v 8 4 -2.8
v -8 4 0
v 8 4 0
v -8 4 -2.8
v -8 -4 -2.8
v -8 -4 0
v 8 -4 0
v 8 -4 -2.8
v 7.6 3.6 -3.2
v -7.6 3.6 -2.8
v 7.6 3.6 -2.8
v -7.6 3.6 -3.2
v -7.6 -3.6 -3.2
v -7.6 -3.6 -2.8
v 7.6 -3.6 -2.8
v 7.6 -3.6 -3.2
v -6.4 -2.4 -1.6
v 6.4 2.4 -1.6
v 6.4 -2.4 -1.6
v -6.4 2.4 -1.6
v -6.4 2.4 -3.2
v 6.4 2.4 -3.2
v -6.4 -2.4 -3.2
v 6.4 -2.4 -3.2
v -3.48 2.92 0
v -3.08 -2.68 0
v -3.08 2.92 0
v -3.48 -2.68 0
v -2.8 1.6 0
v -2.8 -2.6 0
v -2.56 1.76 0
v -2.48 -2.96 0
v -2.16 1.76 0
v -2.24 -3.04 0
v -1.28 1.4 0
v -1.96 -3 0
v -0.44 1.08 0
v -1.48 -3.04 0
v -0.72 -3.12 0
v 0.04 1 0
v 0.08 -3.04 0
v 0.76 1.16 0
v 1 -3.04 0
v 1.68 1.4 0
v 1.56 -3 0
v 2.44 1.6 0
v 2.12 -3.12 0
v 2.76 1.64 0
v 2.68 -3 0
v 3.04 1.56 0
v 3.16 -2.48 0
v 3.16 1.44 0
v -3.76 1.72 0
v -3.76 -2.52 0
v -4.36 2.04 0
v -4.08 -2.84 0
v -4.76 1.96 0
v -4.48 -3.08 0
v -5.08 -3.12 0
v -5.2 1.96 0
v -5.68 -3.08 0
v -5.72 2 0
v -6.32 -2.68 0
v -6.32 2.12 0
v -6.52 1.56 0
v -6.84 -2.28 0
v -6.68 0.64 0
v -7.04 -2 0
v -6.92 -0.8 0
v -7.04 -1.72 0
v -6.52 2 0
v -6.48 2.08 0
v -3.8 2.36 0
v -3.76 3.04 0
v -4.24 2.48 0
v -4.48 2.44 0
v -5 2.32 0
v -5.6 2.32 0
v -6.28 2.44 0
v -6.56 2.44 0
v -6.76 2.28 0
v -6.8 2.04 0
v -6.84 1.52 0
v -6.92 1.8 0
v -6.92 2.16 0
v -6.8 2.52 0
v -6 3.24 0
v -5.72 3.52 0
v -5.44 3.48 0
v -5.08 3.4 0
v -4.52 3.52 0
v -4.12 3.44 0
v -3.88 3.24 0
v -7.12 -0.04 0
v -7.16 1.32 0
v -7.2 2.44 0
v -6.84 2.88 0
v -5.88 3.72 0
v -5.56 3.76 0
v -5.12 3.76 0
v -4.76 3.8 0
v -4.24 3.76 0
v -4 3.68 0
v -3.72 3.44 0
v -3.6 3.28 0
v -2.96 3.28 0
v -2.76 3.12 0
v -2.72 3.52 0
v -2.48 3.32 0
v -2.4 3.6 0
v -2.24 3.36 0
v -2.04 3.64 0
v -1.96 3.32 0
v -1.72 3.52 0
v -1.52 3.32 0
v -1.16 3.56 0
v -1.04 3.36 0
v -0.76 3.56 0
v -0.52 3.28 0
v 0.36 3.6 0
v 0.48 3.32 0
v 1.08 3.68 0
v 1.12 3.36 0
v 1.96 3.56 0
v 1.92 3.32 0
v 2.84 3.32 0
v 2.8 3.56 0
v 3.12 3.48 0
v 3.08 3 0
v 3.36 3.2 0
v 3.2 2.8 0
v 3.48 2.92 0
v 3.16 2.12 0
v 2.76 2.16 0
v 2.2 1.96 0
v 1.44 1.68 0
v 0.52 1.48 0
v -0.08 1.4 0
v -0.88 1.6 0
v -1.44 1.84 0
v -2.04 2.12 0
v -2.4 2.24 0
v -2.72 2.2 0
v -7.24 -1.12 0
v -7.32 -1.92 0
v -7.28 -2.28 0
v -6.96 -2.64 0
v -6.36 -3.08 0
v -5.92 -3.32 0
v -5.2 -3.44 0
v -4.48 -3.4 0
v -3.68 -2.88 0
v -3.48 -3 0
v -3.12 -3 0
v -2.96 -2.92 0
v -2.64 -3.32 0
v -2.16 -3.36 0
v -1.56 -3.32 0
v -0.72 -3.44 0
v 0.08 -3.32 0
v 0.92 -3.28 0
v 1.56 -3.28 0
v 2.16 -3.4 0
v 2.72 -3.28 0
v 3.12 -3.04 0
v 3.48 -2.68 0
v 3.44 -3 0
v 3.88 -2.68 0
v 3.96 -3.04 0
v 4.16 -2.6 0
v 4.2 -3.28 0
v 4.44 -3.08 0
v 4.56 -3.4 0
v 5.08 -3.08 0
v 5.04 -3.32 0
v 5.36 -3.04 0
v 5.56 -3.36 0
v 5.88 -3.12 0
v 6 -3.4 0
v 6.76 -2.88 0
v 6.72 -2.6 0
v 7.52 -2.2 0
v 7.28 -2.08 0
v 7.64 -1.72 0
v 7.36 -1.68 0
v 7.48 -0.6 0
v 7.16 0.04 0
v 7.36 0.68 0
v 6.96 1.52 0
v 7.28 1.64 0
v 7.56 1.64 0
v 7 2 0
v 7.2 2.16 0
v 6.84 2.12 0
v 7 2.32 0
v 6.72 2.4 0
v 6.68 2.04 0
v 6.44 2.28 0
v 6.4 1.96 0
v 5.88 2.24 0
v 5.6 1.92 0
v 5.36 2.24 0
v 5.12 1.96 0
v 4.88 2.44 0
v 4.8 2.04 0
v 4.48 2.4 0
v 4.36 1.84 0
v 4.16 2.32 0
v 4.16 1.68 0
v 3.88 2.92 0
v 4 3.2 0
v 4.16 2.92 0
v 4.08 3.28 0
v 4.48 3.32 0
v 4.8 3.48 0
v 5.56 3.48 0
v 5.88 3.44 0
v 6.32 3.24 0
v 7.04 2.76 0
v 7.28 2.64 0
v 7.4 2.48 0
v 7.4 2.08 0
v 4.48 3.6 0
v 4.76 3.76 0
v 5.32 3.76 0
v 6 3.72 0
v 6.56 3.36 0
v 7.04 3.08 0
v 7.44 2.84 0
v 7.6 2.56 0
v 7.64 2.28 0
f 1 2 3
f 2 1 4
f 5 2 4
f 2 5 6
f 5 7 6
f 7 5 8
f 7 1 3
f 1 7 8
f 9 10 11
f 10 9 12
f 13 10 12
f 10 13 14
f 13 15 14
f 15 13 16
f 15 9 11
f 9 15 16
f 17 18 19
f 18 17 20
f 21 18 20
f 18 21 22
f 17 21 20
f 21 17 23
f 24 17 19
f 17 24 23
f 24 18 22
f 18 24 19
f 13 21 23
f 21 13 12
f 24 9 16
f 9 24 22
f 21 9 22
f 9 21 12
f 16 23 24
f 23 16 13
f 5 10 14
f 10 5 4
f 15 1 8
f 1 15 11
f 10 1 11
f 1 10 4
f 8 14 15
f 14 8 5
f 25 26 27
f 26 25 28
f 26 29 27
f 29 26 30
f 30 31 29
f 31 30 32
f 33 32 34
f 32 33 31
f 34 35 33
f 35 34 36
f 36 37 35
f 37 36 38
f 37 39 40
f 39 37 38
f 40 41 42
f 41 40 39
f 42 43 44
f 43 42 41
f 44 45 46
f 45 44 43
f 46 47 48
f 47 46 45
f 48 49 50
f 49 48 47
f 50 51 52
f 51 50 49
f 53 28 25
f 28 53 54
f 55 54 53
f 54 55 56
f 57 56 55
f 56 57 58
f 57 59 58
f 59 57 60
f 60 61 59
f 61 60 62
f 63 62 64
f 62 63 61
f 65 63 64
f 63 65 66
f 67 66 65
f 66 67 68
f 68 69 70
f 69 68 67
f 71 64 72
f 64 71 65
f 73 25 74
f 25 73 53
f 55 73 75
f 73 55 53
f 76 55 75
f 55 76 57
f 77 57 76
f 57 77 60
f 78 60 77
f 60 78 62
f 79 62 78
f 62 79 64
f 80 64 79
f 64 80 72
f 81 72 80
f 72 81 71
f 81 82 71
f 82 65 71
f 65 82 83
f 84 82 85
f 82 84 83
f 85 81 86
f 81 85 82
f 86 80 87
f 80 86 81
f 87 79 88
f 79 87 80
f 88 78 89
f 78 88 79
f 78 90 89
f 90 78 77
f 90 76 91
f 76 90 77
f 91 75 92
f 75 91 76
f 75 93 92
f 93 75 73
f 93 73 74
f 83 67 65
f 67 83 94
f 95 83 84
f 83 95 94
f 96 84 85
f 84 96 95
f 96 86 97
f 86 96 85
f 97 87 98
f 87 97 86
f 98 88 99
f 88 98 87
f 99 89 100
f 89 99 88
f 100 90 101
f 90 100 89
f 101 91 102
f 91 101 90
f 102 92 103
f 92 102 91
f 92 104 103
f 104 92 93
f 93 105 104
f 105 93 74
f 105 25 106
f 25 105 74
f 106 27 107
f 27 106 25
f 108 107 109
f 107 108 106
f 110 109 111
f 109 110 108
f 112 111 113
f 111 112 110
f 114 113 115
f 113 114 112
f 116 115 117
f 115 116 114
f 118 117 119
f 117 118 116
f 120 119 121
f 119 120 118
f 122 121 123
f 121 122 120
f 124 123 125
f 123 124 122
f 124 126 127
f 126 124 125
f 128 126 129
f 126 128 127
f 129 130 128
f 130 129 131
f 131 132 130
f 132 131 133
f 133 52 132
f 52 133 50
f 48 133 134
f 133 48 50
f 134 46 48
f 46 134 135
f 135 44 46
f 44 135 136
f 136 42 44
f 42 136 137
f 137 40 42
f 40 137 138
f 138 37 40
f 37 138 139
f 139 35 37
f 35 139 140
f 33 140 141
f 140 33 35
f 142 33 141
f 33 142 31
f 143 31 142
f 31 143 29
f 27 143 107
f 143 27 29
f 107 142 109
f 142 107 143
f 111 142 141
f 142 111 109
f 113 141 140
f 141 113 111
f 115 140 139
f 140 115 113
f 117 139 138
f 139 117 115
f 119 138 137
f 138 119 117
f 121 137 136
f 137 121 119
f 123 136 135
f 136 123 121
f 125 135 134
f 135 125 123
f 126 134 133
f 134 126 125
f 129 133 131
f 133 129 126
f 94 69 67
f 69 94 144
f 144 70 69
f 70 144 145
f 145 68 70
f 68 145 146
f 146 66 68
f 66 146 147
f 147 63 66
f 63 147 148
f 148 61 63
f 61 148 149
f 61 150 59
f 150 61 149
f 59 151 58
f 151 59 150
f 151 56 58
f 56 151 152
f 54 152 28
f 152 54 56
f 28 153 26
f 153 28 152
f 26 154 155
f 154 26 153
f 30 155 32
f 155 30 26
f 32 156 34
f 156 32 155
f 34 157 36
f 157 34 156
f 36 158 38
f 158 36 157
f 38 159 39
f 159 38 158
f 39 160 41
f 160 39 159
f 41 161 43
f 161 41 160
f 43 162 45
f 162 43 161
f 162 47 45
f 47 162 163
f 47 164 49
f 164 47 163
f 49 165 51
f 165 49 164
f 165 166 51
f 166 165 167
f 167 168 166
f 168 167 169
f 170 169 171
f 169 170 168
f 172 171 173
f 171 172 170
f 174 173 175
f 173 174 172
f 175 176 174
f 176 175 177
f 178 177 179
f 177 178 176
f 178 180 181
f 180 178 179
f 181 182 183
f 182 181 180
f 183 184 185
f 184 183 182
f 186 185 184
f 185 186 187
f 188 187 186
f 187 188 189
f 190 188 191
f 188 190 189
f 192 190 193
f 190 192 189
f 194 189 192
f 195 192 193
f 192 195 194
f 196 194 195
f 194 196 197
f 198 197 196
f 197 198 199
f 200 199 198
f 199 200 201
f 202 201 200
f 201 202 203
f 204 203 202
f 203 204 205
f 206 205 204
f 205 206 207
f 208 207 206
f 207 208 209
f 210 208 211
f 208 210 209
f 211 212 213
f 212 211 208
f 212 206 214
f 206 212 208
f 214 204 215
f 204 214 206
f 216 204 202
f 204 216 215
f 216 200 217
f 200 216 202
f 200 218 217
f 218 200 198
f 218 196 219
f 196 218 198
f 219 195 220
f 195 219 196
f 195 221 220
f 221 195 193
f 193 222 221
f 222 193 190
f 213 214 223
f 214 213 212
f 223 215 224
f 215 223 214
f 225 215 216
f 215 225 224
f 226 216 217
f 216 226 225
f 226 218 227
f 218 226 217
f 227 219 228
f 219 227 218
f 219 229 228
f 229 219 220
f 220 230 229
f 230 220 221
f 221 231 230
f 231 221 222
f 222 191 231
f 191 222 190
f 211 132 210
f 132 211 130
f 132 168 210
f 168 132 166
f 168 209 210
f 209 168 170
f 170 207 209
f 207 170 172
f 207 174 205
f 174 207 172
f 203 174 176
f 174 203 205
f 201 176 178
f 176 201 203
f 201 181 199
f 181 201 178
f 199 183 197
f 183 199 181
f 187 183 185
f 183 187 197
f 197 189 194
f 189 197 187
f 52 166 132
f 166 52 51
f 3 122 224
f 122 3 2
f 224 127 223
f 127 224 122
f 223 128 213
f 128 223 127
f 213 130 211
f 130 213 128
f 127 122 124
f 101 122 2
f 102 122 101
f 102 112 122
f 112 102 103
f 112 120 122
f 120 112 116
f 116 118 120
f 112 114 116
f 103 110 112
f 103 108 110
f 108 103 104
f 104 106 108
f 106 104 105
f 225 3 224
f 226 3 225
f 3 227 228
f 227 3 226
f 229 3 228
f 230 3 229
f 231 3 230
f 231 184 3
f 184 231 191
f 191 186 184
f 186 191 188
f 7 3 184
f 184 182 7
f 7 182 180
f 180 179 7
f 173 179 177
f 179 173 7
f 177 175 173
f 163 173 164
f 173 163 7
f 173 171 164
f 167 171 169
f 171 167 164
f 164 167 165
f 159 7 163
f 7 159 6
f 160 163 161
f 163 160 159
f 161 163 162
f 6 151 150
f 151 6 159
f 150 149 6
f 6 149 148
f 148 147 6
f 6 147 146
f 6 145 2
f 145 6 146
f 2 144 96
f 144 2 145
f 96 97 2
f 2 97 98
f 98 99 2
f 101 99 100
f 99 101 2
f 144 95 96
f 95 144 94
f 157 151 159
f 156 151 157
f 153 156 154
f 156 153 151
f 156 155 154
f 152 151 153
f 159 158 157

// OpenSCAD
// file: ../p/box5.scad
use <../lib.scad>
function ldraw_lib__box5() = [
// 0 Box with 5 Faces and All Edges
// 0 Name: box5.dat
// 0 Author: James Jessiman
// 0 !LDRAW_ORG Primitive UPDATE 2012-01
// 0 !LICENSE Licensed under CC BY 4.0 : see CAreadme.txt
// 
// 0 BFC CERTIFY CCW
  [0,"BFC","CERTIFY"],
  [0,"BFC","CCW"],
// 
// 0 !HISTORY 2002-04-03 [sbliss] Modified for BFC compliance
// 0 !HISTORY 2002-04-25 [PTadmin] Official Update 2002-02
// 0 !HISTORY 2007-06-24 [PTadmin] Header formatted for Contributor Agreement
// 0 !HISTORY 2008-07-01 [PTadmin] Official Update 2008-01
// 0 !HISTORY 2012-02-16 [Philo] Changed to CCW
// 0 !HISTORY 2012-03-30 [PTadmin] Official Update 2012-01
// 
// 
// 2 24 1 1 1 -1 1 1
  [2,24,1,1,1,-1,1,1],
// 2 24 -1 1 1 -1 1 -1
  [2,24,-1,1,1,-1,1,-1],
// 2 24 -1 1 -1 1 1 -1
  [2,24,-1,1,-1,1,1,-1],
// 2 24 1 1 -1 1 1 1
  [2,24,1,1,-1,1,1,1],
// 2 24 1 0 1 -1 0 1
  [2,24,1,0,1,-1,0,1],
// 2 24 -1 0 1 -1 0 -1
  [2,24,-1,0,1,-1,0,-1],
// 2 24 -1 0 -1 1 0 -1
  [2,24,-1,0,-1,1,0,-1],
// 2 24 1 0 -1 1 0 1
  [2,24,1,0,-1,1,0,1],
// 2 24 1 0 1 1 1 1
  [2,24,1,0,1,1,1,1],
// 2 24 -1 0 1 -1 1 1
  [2,24,-1,0,1,-1,1,1],
// 2 24 1 0 -1 1 1 -1
  [2,24,1,0,-1,1,1,-1],
// 2 24 -1 0 -1 -1 1 -1
  [2,24,-1,0,-1,-1,1,-1],
// 4 16 -1 1 1 1 1 1 1 1 -1 -1 1 -1
  [4,16,-1,1,1,1,1,1,1,1,-1,-1,1,-1],
// 4 16 -1 1 1 -1 0 1 1 0 1 1 1 1
  [4,16,-1,1,1,-1,0,1,1,0,1,1,1,1],
// 4 16 -1 1 -1 -1 0 -1 -1 0 1 -1 1 1
  [4,16,-1,1,-1,-1,0,-1,-1,0,1,-1,1,1],
// 4 16 1 1 -1 1 0 -1 -1 0 -1 -1 1 -1
  [4,16,1,1,-1,1,0,-1,-1,0,-1,-1,1,-1],
// 4 16 1 1 1 1 0 1 1 0 -1 1 1 -1
  [4,16,1,1,1,1,0,1,1,0,-1,1,1,-1],
];
module ldraw_lib__box5(step=0, col=false, unit=2/5, alt=false, line=0.2, solid=!$preview)
    makepoly(ldraw_lib__box5(), step=step, col=col, unit=unit, alt=alt, line=line, solid=solid);
ldraw_lib__box5(line=0.2);
// file: ../p/box4.scad
use <../lib.scad>
function ldraw_lib__box4() = [
// 0 Box with 4 Faces (2 Parallel Pairs) and All Edges
// 0 Name: box4.dat
// 0 Author: James Jessiman
// 0 !LDRAW_ORG Primitive UPDATE 2012-01
// 0 !LICENSE Licensed under CC BY 4.0 : see CAreadme.txt
// 
// 0 BFC CERTIFY CCW
  [0,"BFC","CERTIFY"],
  [0,"BFC","CCW"],
// 
// 0 !HISTORY 2002-04-03 [sbliss] Modified for BFC compliance
// 0 !HISTORY 2002-04-25 [PTadmin] Official Update 2002-02
// 0 !HISTORY 2007-06-24 [PTadmin] Header formatted for Contributor Agreement
// 0 !HISTORY 2008-07-01 [PTadmin] Official Update 2008-01
// 0 !HISTORY 2012-02-16 [Philo] Changed to CCW
// 0 !HISTORY 2012-03-30 [PTadmin] Official Update 2012-01
// 
// 
// 2 24 1 1 1 -1 1 1
  [2,24,1,1,1,-1,1,1],
// 2 24 -1 1 1 -1 1 -1
  [2,24,-1,1,1,-1,1,-1],
// 2 24 -1 1 -1 1 1 -1
  [2,24,-1,1,-1,1,1,-1],
// 2 24 1 1 -1 1 1 1
  [2,24,1,1,-1,1,1,1],
// 2 24 1 0 1 -1 0 1
  [2,24,1,0,1,-1,0,1],
// 2 24 -1 0 1 -1 0 -1
  [2,24,-1,0,1,-1,0,-1],
// 2 24 -1 0 -1 1 0 -1
  [2,24,-1,0,-1,1,0,-1],
// 2 24 1 0 -1 1 0 1
  [2,24,1,0,-1,1,0,1],
// 2 24 1 0 1 1 1 1
  [2,24,1,0,1,1,1,1],
// 2 24 -1 0 1 -1 1 1
  [2,24,-1,0,1,-1,1,1],
// 2 24 1 0 -1 1 1 -1
  [2,24,1,0,-1,1,1,-1],
// 2 24 -1 0 -1 -1 1 -1
  [2,24,-1,0,-1,-1,1,-1],
// 4 16 -1 1 1 -1 0 1 1 0 1 1 1 1
  [4,16,-1,1,1,-1,0,1,1,0,1,1,1,1],
// 4 16 -1 1 -1 -1 0 -1 -1 0 1 -1 1 1
  [4,16,-1,1,-1,-1,0,-1,-1,0,1,-1,1,1],
// 4 16 1 1 -1 1 0 -1 -1 0 -1 -1 1 -1
  [4,16,1,1,-1,1,0,-1,-1,0,-1,-1,1,-1],
// 4 16 1 1 1 1 0 1 1 0 -1 1 1 -1
  [4,16,1,1,1,1,0,1,1,0,-1,1,1,-1],
];
module ldraw_lib__box4(step=0, col=false, unit=2/5, alt=false, line=0.2, solid=!$preview)
    makepoly(ldraw_lib__box4(), step=step, col=col, unit=unit, alt=alt, line=line, solid=solid);
ldraw_lib__box4(line=0.2);
// file: s/3069p0fs02.scad
use <../../lib.scad>
function ldraw_lib__s__3069p0fs02() = [
// 0 ~Tile  1 x  2 with Bedroll Pattern - Frame
// 0 Name: s\3069p0fs02.dat
// 0 Author: Alex Taylor [anathema]
// 0 !LDRAW_ORG Subpart UPDATE 2014-01
// 0 !LICENSE Licensed under CC BY 4.0 : see CAreadme.txt
// 
// 0 BFC CERTIFY CCW
  [0,"BFC","CERTIFY"],
  [0,"BFC","CCW"],
// 
// 0 !HISTORY 2014-01-18 [smr] moved bedroll frame from from 3069bp0f to s\3069p0fs02.dat
// 0 !HISTORY 2014-06-21 [PTadmin] Official Update 2014-01
// 
// 
// 4 16 11.9 0 9.4 20 0 10 -20 0 10 2.7 0 9.2
  [4,16,11.9,0,9.4,20,0,10,-20,0,10,2.7,0,9.2],
// 4 16 11.9 0 9.4 2.7 0 9.2 7 0 8.9 11.2 0 9
  [4,16,11.9,0,9.4,2.7,0,9.2,7,0,8.9,11.2,0,9],
// 4 16 11.2 0 9 7 0 8.9 7.8 0 8.7 10.2 0 8.2
  [4,16,11.2,0,9,7,0,8.9,7.8,0,8.7,10.2,0,8.2],
// 4 16 10.2 0 8.2 7.8 0 8.7 8.4 0 8 10 0 8
  [4,16,10.2,0,8.2,7.8,0,8.7,8.4,0,8,10,0,8],
// 3 16 7 0 8.9 2.7 0 9.2 4.9 0 8.9
  [3,16,7,0,8.9,2.7,0,9.2,4.9,0,8.9],
// 3 16 -11.9 0 9.5 2.7 0 9.2 -20 0 10
  [3,16,-11.9,0,9.5,2.7,0,9.2,-20,0,10],
// 3 16 -10.6 0 9.4 2.7 0 9.2 -11.9 0 9.5
  [3,16,-10.6,0,9.4,2.7,0,9.2,-11.9,0,9.5],
// 4 16 2.7 0 9.2 -10.6 0 9.4 -10 0 9.2 -5.1 0 9.1
  [4,16,2.7,0,9.2,-10.6,0,9.4,-10,0,9.2,-5.1,0,9.1],
// 4 16 2.7 0 9.2 -5.1 0 9.1 -2.9 0 8.9 0.9 0 9
  [4,16,2.7,0,9.2,-5.1,0,9.1,-2.9,0,8.9,0.9,0,9],
// 3 16 -2.9 0 8.9 -1.9 0 8.9 0.9 0 9
  [3,16,-2.9,0,8.9,-1.9,0,8.9,0.9,0,9],
// 3 16 -5.1 0 9.1 -4.3 0 8.8 -2.9 0 8.9
  [3,16,-5.1,0,9.1,-4.3,0,8.8,-2.9,0,8.9],
// 3 16 -10 0 9.2 -6 0 9 -5.1 0 9.1
  [3,16,-10,0,9.2,-6,0,9,-5.1,0,9.1],
// 4 16 -6.8 0 8.8 -6 0 9 -10 0 9.2 -9.3 0 8.6
  [4,16,-6.8,0,8.8,-6,0,9,-10,0,9.2,-9.3,0,8.6],
// 4 16 -7.4 0 8.2 -6.8 0 8.8 -9.3 0 8.6 -9 0 8.2
  [4,16,-7.4,0,8.2,-6.8,0,8.8,-9.3,0,8.6,-9,0,8.2],
// 3 16 13.3 0 9.4 20 0 10 11.9 0 9.4
  [3,16,13.3,0,9.4,20,0,10,11.9,0,9.4],
// 3 16 15 0 9.3 20 0 10 13.3 0 9.4
  [3,16,15,0,9.3,20,0,10,13.3,0,9.4],
// 4 16 20 0 10 15 0 9.3 16.4 0 8.4 17.6 0 7.7
  [4,16,20,0,10,15,0,9.3,16.4,0,8.4,17.6,0,7.7],
// 3 16 18.6 0 7.1 20 0 10 17.6 0 7.7
  [3,16,18.6,0,7.1,20,0,10,17.6,0,7.7],
// 3 16 19 0 6.4 20 0 10 18.6 0 7.1
  [3,16,19,0,6.4,20,0,10,18.6,0,7.1],
// 3 16 19.1 0 5.7 20 0 10 19 0 6.4
  [3,16,19.1,0,5.7,20,0,10,19,0,6.4],
// 4 16 19.1 0 -4.3 20 0 10 19.1 0 5.7 18.9 0 4.1
  [4,16,19.1,0,-4.3,20,0,10,19.1,0,5.7,18.9,0,4.1],
// 4 16 19.1 0 -4.3 18.9 0 4.1 18.4 0 1.7 18.7 0 -1.5
  [4,16,19.1,0,-4.3,18.9,0,4.1,18.4,0,1.7,18.7,0,-1.5],
// 3 16 20 0 -10 20 0 10 19.1 0 -4.3
  [3,16,20,0,-10,20,0,10,19.1,0,-4.3],
// 3 16 19.1 0 -4.3 18.8 0 -5.5 20 0 -10
  [3,16,19.1,0,-4.3,18.8,0,-5.5,20,0,-10],
// 3 16 20 0 -10 18.8 0 -5.5 16.9 0 -7.2
  [3,16,20,0,-10,18.8,0,-5.5,16.9,0,-7.2],
// 3 16 16.9 0 -7.2 15 0 -8.5 20 0 -10
  [3,16,16.9,0,-7.2,15,0,-8.5,20,0,-10],
// 4 16 11.4 0 -8.5 20 0 -10 15 0 -8.5 13.9 0 -8.4
  [4,16,11.4,0,-8.5,20,0,-10,15,0,-8.5,13.9,0,-8.4],
// 3 16 13.9 0 -8.4 12.6 0 -8.3 11.4 0 -8.5
  [3,16,13.9,0,-8.4,12.6,0,-8.3,11.4,0,-8.5],
// 4 16 5.4 0 -8.5 20 0 -10 11.4 0 -8.5 6.8 0 -8.2
  [4,16,5.4,0,-8.5,20,0,-10,11.4,0,-8.5,6.8,0,-8.2],
// 3 16 11.4 0 -8.5 10.5 0 -8.2 6.8 0 -8.2
  [3,16,11.4,0,-8.5,10.5,0,-8.2,6.8,0,-8.2],
// 4 16 6.8 0 -8.2 10.5 0 -8.2 9.9 0 -7.6 8.6 0 -7.5
  [4,16,6.8,0,-8.2,10.5,0,-8.2,9.9,0,-7.6,8.6,0,-7.5],
// 3 16 6.8 0 -8.2 8.6 0 -7.5 7.8 0 -7.6
  [3,16,6.8,0,-8.2,8.6,0,-7.5,7.8,0,-7.6],
// 4 16 -20 0 -10 20 0 -10 5.4 0 -8.5 -1.8 0 -8.6
  [4,16,-20,0,-10,20,0,-10,5.4,0,-8.5,-1.8,0,-8.6],
// 4 16 0.2 0 -8.3 -1.8 0 -8.6 5.4 0 -8.5 2.3 0 -8.2
  [4,16,0.2,0,-8.3,-1.8,0,-8.6,5.4,0,-8.5,2.3,0,-8.2],
// 3 16 2.3 0 -8.2 5.4 0 -8.5 3.9 0 -8.2
  [3,16,2.3,0,-8.2,5.4,0,-8.5,3.9,0,-8.2],
// 4 16 -20 0 -10 -1.8 0 -8.6 -11.2 0 -8.5 -13 0 -8.6
  [4,16,-20,0,-10,-1.8,0,-8.6,-11.2,0,-8.5,-13,0,-8.6],
// 3 16 -13 0 -8.6 -14.8 0 -8.3 -20 0 -10
  [3,16,-13,0,-8.6,-14.8,0,-8.3,-20,0,-10],
// 3 16 -20 0 -10 -14.8 0 -8.3 -15.9 0 -7.7
  [3,16,-20,0,-10,-14.8,0,-8.3,-15.9,0,-7.7],
// 3 16 -15.9 0 -7.7 -17.4 0 -6.6 -20 0 -10
  [3,16,-15.9,0,-7.7,-17.4,0,-6.6,-20,0,-10],
// 3 16 -20 0 -10 -17.4 0 -6.6 -18.2 0 -5.7
  [3,16,-20,0,-10,-17.4,0,-6.6,-18.2,0,-5.7],
// 4 16 -20 0 -10 -18.2 0 -5.7 -18.3 0 -4.8 -20 0 10
  [4,16,-20,0,-10,-18.2,0,-5.7,-18.3,0,-4.8,-20,0,10],
// 4 16 -18 0 6.1 -20 0 10 -18.3 0 -4.8 -18.1 0 -2.8
  [4,16,-18,0,6.1,-20,0,10,-18.3,0,-4.8,-18.1,0,-2.8],
// 3 16 -18 0 6.1 -17.1 0 7.2 -20 0 10
  [3,16,-18,0,6.1,-17.1,0,7.2,-20,0,10],
// 3 16 -20 0 10 -17.1 0 7.2 -14.7 0 9.3
  [3,16,-20,0,10,-17.1,0,7.2,-14.7,0,9.3],
// 3 16 -14.7 0 9.3 -13.9 0 9.4 -20 0 10
  [3,16,-14.7,0,9.3,-13.9,0,9.4,-20,0,10],
// 4 16 -20 0 10 -13.9 0 9.4 -12.8 0 9.4 -11.9 0 9.5
  [4,16,-20,0,10,-13.9,0,9.4,-12.8,0,9.4,-11.9,0,9.5],
// 4 16 -18.1 0 -2.8 -17.8 0 -0.1 -17.9 0 3.3 -18 0 6.1
  [4,16,-18.1,0,-2.8,-17.8,0,-0.1,-17.9,0,3.3,-18,0,6.1],
// 3 16 -5.4 0 -8.4 -11.2 0 -8.5 -1.8 0 -8.6
  [3,16,-5.4,0,-8.4,-11.2,0,-8.5,-1.8,0,-8.6],
// 3 16 -6.6 0 -8.3 -11.2 0 -8.5 -5.4 0 -8.4
  [3,16,-6.6,0,-8.3,-11.2,0,-8.5,-5.4,0,-8.4],
// 4 16 -11.2 0 -8.5 -6.6 0 -8.3 -7.8 0 -7.5 -8.7 0 -7.5
  [4,16,-11.2,0,-8.5,-6.6,0,-8.3,-7.8,0,-7.5,-8.7,0,-7.5],
// 3 16 -6.6 0 -8.3 -7.4 0 -7.3 -7.8 0 -7.5
  [3,16,-6.6,0,-8.3,-7.4,0,-7.3,-7.8,0,-7.5],
// 3 16 -9.2 0 -7.2 -11.2 0 -8.5 -8.7 0 -7.5
  [3,16,-9.2,0,-7.2,-11.2,0,-8.5,-8.7,0,-7.5],
// 3 16 -1.8 0 -8.6 -3.9 0 -8.3 -5.4 0 -8.4
  [3,16,-1.8,0,-8.6,-3.9,0,-8.3,-5.4,0,-8.4],
];
module ldraw_lib__s__3069p0fs02(step=0, col=false, unit=2/5, alt=false, line=0.2, solid=!$preview)
    makepoly(ldraw_lib__s__3069p0fs02(), step=step, col=col, unit=unit, alt=alt, line=line, solid=solid);
ldraw_lib__s__3069p0fs02(line=0.2);
// file: s/3069bs01.scad
use <../../lib.scad>
use <../../p/box4.scad>
use <../../p/box5.scad>
function ldraw_lib__s__3069bs01() = [
// 0 ~Tile  1 x  2 with Groove without Top Face
// 0 Name: s\3069bs01.dat
// 0 Author: Santeri Piippo [arezey]
// 0 !LDRAW_ORG Subpart UPDATE 2010-02
// 0 !LICENSE Licensed under CC BY 4.0 : see CAreadme.txt
// 
// 0 BFC CERTIFY CCW
  [0,"BFC","CERTIFY"],
  [0,"BFC","CCW"],
// 
// 0 !HISTORY 2010-07-05 [PTadmin] Official Update 2010-02
// 
// 
// 1 16 0 0 0 20 0 0 0 7 0 0 0 10 box4.dat
  [1,16,0,0,0,20,0,0,0,7,0,0,0,10, ldraw_lib__box4()],
// 1 16 0 7 0 19 0 0 0 1 0 0 0 9 box4.dat
  [1,16,0,7,0,19,0,0,0,1,0,0,0,9, ldraw_lib__box4()],
// 0 BFC INVERTNEXT
  [0,"BFC","INVERTNEXT"],
// 1 16 0 8 0 16 0 0 0 -4 0 0 0 6 box5.dat
  [1,16,0,8,0,16,0,0,0,-4,0,0,0,6, ldraw_lib__box5()],
// 4 16 -19 8 9 -16 8 6 -16 8 -6 -19 8 -9
  [4,16,-19,8,9,-16,8,6,-16,8,-6,-19,8,-9],
// 4 16 19 8 -9 16 8 -6 16 8 6 19 8 9
  [4,16,19,8,-9,16,8,-6,16,8,6,19,8,9],
// 4 16 19 8 9 16 8 6 -16 8 6 -19 8 9
  [4,16,19,8,9,16,8,6,-16,8,6,-19,8,9],
// 4 16 -19 8 -9 -16 8 -6 16 8 -6 19 8 -9
  [4,16,-19,8,-9,-16,8,-6,16,8,-6,19,8,-9],
// 4 16 -20 7 10 -19 7 9 -19 7 -9 -20 7 -10
  [4,16,-20,7,10,-19,7,9,-19,7,-9,-20,7,-10],
// 4 16 20 7 -10 19 7 -9 19 7 9 20 7 10
  [4,16,20,7,-10,19,7,-9,19,7,9,20,7,10],
// 4 16 20 7 10 19 7 9 -19 7 9 -20 7 10
  [4,16,20,7,10,19,7,9,-19,7,9,-20,7,10],
// 4 16 -20 7 -10 -19 7 -9 19 7 -9 20 7 -10
  [4,16,-20,7,-10,-19,7,-9,19,7,-9,20,7,-10],
// 0 //
];
module ldraw_lib__s__3069bs01(step=0, col=false, unit=2/5, alt=false, line=0.2, solid=!$preview)
    makepoly(ldraw_lib__s__3069bs01(), step=step, col=col, unit=unit, alt=alt, line=line, solid=solid);
ldraw_lib__s__3069bs01(line=0.2);
// main file
use <../lib.scad>
use <s/3069bs01.scad>
use <s/3069p0fs01.scad>
use <s/3069p0fs02.scad>
function ldraw_lib__3069bp0e() = [
// 0 Tile  1 x  2 with Dark Bluish Grey Bedroll Pattern
// 0 Name: 3069bp0e.dat
// 0 Author: Magnus Forsberg [MagFors]
// 0 !LDRAW_ORG Part UPDATE 2015-01
// 0 !LICENSE Licensed under CC BY 4.0 : see CAreadme.txt
// 
// 0 BFC CERTIFY CCW
  [0,"BFC","CERTIFY"],
  [0,"BFC","CCW"],
// 
// 0 !KEYWORDS BrickLink 3069pb0049, Rebrickable 3069bpr0031, set 4750
// 
// 0 !HISTORY 2015-10-11 [PTadmin] Official Update 2015-01
// 
// 
// 1 16 0 0 0 1 0 0 0 1 0 0 0 1 s\3069bs01.dat
  [1,16,0,0,0,1,0,0,0,1,0,0,0,1, ldraw_lib__s__3069bs01()],
// 1 72 0 0 0 1 0 0 0 1 0 0 0 1 s\3069p0fs01.dat
  [1,72,0,0,0,1,0,0,0,1,0,0,0,1, ldraw_lib__s__3069p0fs01()],
// 1 16 0 0 0 1 0 0 0 1 0 0 0 1 s\3069p0fs02.dat
  [1,16,0,0,0,1,0,0,0,1,0,0,0,1, ldraw_lib__s__3069p0fs02()],
];
module ldraw_lib__3069bp0e(step=0, col=false, unit=2/5, alt=false, line=0.2, solid=!$preview)
    makepoly(ldraw_lib__3069bp0e(), step=step, col=col, unit=unit, alt=alt, line=line, solid=solid);
ldraw_lib__3069bp0e(line=0.2);
